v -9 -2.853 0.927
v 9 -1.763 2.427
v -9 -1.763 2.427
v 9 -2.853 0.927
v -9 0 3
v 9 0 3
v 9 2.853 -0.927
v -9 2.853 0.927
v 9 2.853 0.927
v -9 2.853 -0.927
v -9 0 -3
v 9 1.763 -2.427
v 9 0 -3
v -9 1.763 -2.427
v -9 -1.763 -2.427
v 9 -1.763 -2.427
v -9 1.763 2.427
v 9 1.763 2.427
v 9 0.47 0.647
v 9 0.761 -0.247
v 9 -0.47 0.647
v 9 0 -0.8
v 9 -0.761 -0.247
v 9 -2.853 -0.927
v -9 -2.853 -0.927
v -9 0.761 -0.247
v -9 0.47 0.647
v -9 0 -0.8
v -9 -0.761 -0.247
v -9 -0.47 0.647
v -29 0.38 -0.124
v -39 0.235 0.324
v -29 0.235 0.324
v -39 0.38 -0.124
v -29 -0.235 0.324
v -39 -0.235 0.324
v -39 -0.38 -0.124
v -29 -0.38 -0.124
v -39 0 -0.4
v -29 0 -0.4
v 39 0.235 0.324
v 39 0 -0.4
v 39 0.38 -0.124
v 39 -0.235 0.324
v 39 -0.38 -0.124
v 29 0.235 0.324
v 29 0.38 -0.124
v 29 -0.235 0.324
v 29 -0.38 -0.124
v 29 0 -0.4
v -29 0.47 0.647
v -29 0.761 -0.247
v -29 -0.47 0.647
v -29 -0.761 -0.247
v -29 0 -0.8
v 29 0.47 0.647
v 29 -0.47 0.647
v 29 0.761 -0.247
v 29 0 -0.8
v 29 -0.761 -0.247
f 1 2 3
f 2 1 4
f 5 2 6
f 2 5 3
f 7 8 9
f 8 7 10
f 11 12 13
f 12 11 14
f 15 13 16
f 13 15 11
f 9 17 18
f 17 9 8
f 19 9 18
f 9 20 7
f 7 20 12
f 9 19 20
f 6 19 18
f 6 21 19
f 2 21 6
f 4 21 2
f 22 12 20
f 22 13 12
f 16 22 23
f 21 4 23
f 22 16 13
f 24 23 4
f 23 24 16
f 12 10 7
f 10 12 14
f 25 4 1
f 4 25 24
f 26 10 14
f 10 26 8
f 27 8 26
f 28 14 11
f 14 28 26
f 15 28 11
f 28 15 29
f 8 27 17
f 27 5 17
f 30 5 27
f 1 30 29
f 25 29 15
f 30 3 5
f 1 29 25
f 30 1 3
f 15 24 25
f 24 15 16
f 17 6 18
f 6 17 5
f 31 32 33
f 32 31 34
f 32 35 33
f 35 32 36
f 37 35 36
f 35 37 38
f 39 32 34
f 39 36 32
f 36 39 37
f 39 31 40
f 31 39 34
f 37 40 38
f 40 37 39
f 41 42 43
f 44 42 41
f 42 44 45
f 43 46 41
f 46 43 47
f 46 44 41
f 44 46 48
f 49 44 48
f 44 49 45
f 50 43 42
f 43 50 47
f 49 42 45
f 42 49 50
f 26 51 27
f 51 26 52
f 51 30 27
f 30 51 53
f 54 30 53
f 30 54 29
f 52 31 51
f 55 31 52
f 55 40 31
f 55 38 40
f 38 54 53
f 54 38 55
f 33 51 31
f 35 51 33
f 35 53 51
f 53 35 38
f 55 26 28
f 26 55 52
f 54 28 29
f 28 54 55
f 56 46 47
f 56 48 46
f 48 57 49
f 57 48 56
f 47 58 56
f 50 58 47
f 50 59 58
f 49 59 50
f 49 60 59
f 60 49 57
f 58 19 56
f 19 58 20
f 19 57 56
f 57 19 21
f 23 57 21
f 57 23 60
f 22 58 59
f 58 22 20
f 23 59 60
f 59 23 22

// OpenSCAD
// Parameters
resistance_value_ohm = 5.6; //[0.1:100:0.1]
power_rating_w = 3; //[1:10:1]
lead_count = 2; //[2:2:1]
body_length_mm = 18; //[9:36:1]
body_diameter_mm = 6; //[3:12:0.5]
lead_diameter_mm = 0.8; //[0.4:1.6:0.1]
lead_length_each_mm = 30; //[15:60:1]
lead_span_mm = 78; //[40:140:1]
lead_body_overlap_mm = 1; //[0.5:2:0.1]
sleeve_enabled = 1; //[0:1:1]
sleeve_outer_diameter_mm = 1.6; //[1:3.2:0.1]
sleeve_length_each_mm = 20; //[5:40:1]
sleeve_body_overlap_mm = 1; //[0.5:2:0.1]
al_clad_enabled = 0; //[0:1:1]
al_clad_length_mm = 25; //[12.5:50:1]
al_clad_width_mm = 15; //[7.5:30:1]
al_clad_height_mm = 10; //[5:20:1]
al_clad_shell_thickness_mm = 1.5; //[0.8:3:0.1]
al_clad_overlap_into_lead_mm = 1; //[0.5:2:0.1]
tolerance = 5; //[1:10:1]

// Resistor - complete geometry
module resistor() {
  color("DimGray") {
    // Cylindrical body
    rotate([0, 90, 0])
      cylinder(r=body_diameter_mm/2, h=body_length_mm, center=true);
    
    // Leads
    translate([-(body_length_mm/2 + (lead_length_each_mm + lead_body_overlap_mm)/2 - lead_body_overlap_mm), 0, 0])
      rotate([0, 90, 0])
      cylinder(r=lead_diameter_mm/2, h=lead_length_each_mm + lead_body_overlap_mm, center=true);
    translate([(body_length_mm/2 + (lead_length_each_mm + lead_body_overlap_mm)/2 - lead_body_overlap_mm), 0, 0])
      rotate([0, 90, 0])
      cylinder(r=lead_diameter_mm/2, h=lead_length_each_mm + lead_body_overlap_mm, center=true);
  }
}

// Sleeved Resistor - complete geometry
module sleeved_resistor() {
  resistor();
  if (sleeve_enabled) {
    color("White") {
      // Sleeves
      translate([-(body_length_mm/2 + (sleeve_length_each_mm + sleeve_body_overlap_mm)/2 - sleeve_body_overlap_mm), 0, 0])
        rotate([0, 90, 0])
        cylinder(r=sleeve_outer_diameter_mm/2, h=sleeve_length_each_mm + sleeve_body_overlap_mm, center=true);
      translate([(body_length_mm/2 + (sleeve_length_each_mm + sleeve_body_overlap_mm)/2 - sleeve_body_overlap_mm), 0, 0])
        rotate([0, 90, 0])
        cylinder(r=sleeve_outer_diameter_mm/2, h=sleeve_length_each_mm + sleeve_body_overlap_mm, center=true);
    }
  }
}

// Al Clad Resistor - complete geometry
module al_clad_resistor() {
  color("Silver") {
    // Al-clad shell
    difference() {
      translate([0, 0, -(body_diameter_mm/2 + al_clad_height_mm/2 - al_clad_overlap_into_lead_mm)])
        cube([al_clad_length_mm, al_clad_width_mm, al_clad_height_mm], center=true);
      translate([0, 0, -(body_diameter_mm/2 + al_clad_height_mm/2 - al_clad_overlap_into_lead_mm)])
        cube([al_clad_length_mm - 2*al_clad_shell_thickness_mm, al_clad_width_mm - 2*al_clad_shell_thickness_mm, al_clad_height_mm - 2*al_clad_shell_thickness_mm], center=true);
    }
    // Al-clad core
    translate([0, 0, -(body_diameter_mm/2 + al_clad_height_mm/2 - al_clad_overlap_into_lead_mm)])
      rotate([0, 90, 0])
      cylinder(r=min(al_clad_width_mm, al_clad_height_mm)/2 - al_clad_shell_thickness_mm, h=al_clad_length_mm - 2*al_clad_shell_thickness_mm, center=true);
  }
}

// Al Clad Resistor Assembly - complete geometry
module al_clad_resistor_assembly() {
  sleeved_resistor();
  if (al_clad_enabled) {
    al_clad_resistor();
  }
}

// Assembly
module assembly() {
  al_clad_resistor_assembly();
}

assembly();
